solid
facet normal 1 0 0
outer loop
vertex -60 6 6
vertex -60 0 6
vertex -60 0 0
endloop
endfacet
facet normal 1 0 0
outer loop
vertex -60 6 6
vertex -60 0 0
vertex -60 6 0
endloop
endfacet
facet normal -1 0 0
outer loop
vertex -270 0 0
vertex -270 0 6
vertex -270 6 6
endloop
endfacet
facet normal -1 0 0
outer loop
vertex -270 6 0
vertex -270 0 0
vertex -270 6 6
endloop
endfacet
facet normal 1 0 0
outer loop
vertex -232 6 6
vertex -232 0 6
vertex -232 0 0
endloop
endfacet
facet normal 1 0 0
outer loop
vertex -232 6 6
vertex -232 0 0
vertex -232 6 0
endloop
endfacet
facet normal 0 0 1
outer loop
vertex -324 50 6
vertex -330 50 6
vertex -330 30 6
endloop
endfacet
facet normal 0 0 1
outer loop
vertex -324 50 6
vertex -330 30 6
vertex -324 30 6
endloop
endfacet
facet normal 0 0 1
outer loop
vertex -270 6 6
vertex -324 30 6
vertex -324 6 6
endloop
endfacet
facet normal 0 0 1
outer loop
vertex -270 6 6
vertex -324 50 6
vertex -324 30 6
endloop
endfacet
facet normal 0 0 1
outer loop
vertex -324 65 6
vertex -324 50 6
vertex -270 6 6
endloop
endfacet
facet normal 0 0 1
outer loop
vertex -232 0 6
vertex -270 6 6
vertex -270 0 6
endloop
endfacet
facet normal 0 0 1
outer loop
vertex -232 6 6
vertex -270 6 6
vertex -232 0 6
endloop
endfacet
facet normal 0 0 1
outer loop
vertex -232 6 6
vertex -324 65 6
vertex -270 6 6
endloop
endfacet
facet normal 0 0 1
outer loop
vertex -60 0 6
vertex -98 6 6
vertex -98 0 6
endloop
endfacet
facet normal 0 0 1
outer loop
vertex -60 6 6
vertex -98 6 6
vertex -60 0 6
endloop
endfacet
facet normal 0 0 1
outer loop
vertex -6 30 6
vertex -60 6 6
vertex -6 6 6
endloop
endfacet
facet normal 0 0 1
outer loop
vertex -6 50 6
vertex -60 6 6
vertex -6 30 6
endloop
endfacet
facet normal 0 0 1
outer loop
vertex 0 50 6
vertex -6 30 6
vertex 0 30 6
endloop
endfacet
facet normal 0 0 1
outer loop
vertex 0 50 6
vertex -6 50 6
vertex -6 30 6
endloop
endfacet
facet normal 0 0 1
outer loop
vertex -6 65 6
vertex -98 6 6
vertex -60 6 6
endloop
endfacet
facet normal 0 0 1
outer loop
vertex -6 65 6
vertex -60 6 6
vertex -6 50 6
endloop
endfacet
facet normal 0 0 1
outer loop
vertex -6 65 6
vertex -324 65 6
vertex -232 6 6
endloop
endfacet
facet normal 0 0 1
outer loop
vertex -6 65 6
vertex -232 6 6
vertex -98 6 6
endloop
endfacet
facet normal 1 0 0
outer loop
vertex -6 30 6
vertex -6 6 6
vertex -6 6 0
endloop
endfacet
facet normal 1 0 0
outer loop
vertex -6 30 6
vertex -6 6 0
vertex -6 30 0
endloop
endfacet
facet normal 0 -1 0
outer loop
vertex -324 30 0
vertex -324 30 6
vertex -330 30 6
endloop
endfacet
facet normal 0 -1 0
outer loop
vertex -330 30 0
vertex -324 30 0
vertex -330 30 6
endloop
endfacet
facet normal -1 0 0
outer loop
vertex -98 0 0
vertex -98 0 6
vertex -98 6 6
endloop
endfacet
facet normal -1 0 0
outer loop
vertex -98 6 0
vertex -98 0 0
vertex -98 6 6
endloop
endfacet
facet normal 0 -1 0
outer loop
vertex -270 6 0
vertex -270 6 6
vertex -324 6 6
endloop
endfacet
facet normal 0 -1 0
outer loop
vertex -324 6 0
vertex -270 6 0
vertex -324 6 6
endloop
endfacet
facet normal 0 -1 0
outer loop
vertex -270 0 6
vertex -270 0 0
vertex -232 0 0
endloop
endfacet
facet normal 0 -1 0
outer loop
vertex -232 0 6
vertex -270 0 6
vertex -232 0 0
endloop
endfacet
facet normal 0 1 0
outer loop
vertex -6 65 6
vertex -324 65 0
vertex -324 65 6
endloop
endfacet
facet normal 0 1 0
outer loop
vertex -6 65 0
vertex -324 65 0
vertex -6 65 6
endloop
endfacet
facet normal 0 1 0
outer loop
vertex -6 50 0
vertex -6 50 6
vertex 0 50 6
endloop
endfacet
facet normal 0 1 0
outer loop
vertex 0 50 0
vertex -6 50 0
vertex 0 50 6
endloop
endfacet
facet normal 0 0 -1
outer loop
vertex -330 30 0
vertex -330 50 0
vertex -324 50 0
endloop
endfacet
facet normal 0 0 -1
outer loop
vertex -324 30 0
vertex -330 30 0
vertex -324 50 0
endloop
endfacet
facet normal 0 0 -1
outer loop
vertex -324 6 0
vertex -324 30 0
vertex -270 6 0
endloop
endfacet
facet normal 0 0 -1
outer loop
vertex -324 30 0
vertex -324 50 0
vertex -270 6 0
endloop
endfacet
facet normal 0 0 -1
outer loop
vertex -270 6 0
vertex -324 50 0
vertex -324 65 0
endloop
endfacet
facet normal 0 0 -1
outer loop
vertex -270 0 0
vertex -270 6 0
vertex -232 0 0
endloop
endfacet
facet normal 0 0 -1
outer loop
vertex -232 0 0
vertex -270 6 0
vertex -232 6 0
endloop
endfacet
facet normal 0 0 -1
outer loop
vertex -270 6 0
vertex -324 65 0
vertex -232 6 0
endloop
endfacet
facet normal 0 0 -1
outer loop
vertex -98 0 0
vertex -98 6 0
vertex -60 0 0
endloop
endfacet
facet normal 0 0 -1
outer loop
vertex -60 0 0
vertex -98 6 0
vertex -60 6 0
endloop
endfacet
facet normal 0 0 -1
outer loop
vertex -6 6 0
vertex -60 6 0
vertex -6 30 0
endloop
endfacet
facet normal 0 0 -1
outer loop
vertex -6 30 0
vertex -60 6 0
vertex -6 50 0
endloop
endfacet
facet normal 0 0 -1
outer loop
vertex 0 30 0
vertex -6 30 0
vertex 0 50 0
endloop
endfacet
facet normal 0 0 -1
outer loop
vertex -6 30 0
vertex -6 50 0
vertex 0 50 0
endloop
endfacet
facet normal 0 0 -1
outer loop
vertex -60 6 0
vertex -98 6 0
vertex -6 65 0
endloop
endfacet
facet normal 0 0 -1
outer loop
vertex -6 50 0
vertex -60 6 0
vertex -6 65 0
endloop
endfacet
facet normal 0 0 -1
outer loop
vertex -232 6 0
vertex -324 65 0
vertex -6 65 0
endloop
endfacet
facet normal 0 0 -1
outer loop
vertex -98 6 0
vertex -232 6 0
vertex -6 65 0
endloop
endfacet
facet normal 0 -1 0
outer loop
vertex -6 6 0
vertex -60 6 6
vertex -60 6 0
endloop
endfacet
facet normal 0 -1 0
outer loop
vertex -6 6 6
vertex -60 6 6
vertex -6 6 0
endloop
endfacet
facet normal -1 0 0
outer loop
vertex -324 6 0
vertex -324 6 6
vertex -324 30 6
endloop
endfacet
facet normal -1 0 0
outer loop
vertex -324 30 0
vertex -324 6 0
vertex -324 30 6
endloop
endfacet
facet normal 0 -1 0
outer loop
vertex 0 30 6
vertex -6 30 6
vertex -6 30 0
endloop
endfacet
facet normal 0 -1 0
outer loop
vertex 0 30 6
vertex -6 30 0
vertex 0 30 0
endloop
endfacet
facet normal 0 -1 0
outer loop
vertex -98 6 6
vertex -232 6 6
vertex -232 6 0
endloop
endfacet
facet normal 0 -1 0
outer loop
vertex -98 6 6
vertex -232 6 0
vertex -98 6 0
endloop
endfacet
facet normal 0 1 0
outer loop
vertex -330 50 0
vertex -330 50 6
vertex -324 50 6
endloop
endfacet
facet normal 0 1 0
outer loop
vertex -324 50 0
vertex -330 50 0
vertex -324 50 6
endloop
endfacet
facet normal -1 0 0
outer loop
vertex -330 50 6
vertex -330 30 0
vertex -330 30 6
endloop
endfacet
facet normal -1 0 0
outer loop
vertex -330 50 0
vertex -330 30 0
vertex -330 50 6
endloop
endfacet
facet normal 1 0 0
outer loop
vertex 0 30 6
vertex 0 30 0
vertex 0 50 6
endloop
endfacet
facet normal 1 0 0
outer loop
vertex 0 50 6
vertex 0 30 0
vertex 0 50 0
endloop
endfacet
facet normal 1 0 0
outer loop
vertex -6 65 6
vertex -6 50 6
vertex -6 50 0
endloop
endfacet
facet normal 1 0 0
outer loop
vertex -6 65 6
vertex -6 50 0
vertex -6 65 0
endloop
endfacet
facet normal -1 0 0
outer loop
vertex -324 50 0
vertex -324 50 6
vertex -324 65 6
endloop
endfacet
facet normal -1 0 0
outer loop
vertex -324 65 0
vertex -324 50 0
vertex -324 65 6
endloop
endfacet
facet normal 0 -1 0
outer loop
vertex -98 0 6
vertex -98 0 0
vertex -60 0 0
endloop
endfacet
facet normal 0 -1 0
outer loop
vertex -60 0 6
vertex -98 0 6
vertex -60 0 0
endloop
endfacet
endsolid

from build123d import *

# Parameters (mm, degrees)
ESQUISSE1_W             = 330
ESQUISSE1_H             = 65
BOSS_EXTRU_1_DEPTH      = 6
ESQUISSE2_W             = 134
ESQUISSE2_H             = 6
ESQUISSE2_W_2           = 6
ESQUISSE2_H_2           = 15
ENL_V_MAT_EXTRU_1_DEPTH = 6


with BuildPart() as part:
    # Esquisse1 → Boss.-Extru.1 (new body)
    with BuildSketch(Plane.XY):
        with Locations((-165, 32.5)):
            Rectangle(ESQUISSE1_W, ESQUISSE1_H)
    extrude(amount=BOSS_EXTRU_1_DEPTH)

    # Esquisse2 → Enlèv. mat.-Extru.1 (cut)
    with BuildSketch(Plane.XY.offset(6)):
        Polygon((-330, 0), (-270, 0), (-270, 6), (-324, 6), (-324, 30), (-330, 30), align=None)
        Polygon((0, 0), (-60, 0), (-60, 6), (-6, 6), (-6, 30), (0, 30), align=None)
        with Locations((-165, 3)):
            Rectangle(ESQUISSE2_W, ESQUISSE2_H)
        with Locations((-327, 57.5)):
            Rectangle(ESQUISSE2_W_2, ESQUISSE2_H_2)
        with Locations((-3, 57.5)):
            Rectangle(ESQUISSE2_W_2, ESQUISSE2_H_2)
    extrude(amount=-ENL_V_MAT_EXTRU_1_DEPTH, mode=Mode.SUBTRACT)


solid = part.part
